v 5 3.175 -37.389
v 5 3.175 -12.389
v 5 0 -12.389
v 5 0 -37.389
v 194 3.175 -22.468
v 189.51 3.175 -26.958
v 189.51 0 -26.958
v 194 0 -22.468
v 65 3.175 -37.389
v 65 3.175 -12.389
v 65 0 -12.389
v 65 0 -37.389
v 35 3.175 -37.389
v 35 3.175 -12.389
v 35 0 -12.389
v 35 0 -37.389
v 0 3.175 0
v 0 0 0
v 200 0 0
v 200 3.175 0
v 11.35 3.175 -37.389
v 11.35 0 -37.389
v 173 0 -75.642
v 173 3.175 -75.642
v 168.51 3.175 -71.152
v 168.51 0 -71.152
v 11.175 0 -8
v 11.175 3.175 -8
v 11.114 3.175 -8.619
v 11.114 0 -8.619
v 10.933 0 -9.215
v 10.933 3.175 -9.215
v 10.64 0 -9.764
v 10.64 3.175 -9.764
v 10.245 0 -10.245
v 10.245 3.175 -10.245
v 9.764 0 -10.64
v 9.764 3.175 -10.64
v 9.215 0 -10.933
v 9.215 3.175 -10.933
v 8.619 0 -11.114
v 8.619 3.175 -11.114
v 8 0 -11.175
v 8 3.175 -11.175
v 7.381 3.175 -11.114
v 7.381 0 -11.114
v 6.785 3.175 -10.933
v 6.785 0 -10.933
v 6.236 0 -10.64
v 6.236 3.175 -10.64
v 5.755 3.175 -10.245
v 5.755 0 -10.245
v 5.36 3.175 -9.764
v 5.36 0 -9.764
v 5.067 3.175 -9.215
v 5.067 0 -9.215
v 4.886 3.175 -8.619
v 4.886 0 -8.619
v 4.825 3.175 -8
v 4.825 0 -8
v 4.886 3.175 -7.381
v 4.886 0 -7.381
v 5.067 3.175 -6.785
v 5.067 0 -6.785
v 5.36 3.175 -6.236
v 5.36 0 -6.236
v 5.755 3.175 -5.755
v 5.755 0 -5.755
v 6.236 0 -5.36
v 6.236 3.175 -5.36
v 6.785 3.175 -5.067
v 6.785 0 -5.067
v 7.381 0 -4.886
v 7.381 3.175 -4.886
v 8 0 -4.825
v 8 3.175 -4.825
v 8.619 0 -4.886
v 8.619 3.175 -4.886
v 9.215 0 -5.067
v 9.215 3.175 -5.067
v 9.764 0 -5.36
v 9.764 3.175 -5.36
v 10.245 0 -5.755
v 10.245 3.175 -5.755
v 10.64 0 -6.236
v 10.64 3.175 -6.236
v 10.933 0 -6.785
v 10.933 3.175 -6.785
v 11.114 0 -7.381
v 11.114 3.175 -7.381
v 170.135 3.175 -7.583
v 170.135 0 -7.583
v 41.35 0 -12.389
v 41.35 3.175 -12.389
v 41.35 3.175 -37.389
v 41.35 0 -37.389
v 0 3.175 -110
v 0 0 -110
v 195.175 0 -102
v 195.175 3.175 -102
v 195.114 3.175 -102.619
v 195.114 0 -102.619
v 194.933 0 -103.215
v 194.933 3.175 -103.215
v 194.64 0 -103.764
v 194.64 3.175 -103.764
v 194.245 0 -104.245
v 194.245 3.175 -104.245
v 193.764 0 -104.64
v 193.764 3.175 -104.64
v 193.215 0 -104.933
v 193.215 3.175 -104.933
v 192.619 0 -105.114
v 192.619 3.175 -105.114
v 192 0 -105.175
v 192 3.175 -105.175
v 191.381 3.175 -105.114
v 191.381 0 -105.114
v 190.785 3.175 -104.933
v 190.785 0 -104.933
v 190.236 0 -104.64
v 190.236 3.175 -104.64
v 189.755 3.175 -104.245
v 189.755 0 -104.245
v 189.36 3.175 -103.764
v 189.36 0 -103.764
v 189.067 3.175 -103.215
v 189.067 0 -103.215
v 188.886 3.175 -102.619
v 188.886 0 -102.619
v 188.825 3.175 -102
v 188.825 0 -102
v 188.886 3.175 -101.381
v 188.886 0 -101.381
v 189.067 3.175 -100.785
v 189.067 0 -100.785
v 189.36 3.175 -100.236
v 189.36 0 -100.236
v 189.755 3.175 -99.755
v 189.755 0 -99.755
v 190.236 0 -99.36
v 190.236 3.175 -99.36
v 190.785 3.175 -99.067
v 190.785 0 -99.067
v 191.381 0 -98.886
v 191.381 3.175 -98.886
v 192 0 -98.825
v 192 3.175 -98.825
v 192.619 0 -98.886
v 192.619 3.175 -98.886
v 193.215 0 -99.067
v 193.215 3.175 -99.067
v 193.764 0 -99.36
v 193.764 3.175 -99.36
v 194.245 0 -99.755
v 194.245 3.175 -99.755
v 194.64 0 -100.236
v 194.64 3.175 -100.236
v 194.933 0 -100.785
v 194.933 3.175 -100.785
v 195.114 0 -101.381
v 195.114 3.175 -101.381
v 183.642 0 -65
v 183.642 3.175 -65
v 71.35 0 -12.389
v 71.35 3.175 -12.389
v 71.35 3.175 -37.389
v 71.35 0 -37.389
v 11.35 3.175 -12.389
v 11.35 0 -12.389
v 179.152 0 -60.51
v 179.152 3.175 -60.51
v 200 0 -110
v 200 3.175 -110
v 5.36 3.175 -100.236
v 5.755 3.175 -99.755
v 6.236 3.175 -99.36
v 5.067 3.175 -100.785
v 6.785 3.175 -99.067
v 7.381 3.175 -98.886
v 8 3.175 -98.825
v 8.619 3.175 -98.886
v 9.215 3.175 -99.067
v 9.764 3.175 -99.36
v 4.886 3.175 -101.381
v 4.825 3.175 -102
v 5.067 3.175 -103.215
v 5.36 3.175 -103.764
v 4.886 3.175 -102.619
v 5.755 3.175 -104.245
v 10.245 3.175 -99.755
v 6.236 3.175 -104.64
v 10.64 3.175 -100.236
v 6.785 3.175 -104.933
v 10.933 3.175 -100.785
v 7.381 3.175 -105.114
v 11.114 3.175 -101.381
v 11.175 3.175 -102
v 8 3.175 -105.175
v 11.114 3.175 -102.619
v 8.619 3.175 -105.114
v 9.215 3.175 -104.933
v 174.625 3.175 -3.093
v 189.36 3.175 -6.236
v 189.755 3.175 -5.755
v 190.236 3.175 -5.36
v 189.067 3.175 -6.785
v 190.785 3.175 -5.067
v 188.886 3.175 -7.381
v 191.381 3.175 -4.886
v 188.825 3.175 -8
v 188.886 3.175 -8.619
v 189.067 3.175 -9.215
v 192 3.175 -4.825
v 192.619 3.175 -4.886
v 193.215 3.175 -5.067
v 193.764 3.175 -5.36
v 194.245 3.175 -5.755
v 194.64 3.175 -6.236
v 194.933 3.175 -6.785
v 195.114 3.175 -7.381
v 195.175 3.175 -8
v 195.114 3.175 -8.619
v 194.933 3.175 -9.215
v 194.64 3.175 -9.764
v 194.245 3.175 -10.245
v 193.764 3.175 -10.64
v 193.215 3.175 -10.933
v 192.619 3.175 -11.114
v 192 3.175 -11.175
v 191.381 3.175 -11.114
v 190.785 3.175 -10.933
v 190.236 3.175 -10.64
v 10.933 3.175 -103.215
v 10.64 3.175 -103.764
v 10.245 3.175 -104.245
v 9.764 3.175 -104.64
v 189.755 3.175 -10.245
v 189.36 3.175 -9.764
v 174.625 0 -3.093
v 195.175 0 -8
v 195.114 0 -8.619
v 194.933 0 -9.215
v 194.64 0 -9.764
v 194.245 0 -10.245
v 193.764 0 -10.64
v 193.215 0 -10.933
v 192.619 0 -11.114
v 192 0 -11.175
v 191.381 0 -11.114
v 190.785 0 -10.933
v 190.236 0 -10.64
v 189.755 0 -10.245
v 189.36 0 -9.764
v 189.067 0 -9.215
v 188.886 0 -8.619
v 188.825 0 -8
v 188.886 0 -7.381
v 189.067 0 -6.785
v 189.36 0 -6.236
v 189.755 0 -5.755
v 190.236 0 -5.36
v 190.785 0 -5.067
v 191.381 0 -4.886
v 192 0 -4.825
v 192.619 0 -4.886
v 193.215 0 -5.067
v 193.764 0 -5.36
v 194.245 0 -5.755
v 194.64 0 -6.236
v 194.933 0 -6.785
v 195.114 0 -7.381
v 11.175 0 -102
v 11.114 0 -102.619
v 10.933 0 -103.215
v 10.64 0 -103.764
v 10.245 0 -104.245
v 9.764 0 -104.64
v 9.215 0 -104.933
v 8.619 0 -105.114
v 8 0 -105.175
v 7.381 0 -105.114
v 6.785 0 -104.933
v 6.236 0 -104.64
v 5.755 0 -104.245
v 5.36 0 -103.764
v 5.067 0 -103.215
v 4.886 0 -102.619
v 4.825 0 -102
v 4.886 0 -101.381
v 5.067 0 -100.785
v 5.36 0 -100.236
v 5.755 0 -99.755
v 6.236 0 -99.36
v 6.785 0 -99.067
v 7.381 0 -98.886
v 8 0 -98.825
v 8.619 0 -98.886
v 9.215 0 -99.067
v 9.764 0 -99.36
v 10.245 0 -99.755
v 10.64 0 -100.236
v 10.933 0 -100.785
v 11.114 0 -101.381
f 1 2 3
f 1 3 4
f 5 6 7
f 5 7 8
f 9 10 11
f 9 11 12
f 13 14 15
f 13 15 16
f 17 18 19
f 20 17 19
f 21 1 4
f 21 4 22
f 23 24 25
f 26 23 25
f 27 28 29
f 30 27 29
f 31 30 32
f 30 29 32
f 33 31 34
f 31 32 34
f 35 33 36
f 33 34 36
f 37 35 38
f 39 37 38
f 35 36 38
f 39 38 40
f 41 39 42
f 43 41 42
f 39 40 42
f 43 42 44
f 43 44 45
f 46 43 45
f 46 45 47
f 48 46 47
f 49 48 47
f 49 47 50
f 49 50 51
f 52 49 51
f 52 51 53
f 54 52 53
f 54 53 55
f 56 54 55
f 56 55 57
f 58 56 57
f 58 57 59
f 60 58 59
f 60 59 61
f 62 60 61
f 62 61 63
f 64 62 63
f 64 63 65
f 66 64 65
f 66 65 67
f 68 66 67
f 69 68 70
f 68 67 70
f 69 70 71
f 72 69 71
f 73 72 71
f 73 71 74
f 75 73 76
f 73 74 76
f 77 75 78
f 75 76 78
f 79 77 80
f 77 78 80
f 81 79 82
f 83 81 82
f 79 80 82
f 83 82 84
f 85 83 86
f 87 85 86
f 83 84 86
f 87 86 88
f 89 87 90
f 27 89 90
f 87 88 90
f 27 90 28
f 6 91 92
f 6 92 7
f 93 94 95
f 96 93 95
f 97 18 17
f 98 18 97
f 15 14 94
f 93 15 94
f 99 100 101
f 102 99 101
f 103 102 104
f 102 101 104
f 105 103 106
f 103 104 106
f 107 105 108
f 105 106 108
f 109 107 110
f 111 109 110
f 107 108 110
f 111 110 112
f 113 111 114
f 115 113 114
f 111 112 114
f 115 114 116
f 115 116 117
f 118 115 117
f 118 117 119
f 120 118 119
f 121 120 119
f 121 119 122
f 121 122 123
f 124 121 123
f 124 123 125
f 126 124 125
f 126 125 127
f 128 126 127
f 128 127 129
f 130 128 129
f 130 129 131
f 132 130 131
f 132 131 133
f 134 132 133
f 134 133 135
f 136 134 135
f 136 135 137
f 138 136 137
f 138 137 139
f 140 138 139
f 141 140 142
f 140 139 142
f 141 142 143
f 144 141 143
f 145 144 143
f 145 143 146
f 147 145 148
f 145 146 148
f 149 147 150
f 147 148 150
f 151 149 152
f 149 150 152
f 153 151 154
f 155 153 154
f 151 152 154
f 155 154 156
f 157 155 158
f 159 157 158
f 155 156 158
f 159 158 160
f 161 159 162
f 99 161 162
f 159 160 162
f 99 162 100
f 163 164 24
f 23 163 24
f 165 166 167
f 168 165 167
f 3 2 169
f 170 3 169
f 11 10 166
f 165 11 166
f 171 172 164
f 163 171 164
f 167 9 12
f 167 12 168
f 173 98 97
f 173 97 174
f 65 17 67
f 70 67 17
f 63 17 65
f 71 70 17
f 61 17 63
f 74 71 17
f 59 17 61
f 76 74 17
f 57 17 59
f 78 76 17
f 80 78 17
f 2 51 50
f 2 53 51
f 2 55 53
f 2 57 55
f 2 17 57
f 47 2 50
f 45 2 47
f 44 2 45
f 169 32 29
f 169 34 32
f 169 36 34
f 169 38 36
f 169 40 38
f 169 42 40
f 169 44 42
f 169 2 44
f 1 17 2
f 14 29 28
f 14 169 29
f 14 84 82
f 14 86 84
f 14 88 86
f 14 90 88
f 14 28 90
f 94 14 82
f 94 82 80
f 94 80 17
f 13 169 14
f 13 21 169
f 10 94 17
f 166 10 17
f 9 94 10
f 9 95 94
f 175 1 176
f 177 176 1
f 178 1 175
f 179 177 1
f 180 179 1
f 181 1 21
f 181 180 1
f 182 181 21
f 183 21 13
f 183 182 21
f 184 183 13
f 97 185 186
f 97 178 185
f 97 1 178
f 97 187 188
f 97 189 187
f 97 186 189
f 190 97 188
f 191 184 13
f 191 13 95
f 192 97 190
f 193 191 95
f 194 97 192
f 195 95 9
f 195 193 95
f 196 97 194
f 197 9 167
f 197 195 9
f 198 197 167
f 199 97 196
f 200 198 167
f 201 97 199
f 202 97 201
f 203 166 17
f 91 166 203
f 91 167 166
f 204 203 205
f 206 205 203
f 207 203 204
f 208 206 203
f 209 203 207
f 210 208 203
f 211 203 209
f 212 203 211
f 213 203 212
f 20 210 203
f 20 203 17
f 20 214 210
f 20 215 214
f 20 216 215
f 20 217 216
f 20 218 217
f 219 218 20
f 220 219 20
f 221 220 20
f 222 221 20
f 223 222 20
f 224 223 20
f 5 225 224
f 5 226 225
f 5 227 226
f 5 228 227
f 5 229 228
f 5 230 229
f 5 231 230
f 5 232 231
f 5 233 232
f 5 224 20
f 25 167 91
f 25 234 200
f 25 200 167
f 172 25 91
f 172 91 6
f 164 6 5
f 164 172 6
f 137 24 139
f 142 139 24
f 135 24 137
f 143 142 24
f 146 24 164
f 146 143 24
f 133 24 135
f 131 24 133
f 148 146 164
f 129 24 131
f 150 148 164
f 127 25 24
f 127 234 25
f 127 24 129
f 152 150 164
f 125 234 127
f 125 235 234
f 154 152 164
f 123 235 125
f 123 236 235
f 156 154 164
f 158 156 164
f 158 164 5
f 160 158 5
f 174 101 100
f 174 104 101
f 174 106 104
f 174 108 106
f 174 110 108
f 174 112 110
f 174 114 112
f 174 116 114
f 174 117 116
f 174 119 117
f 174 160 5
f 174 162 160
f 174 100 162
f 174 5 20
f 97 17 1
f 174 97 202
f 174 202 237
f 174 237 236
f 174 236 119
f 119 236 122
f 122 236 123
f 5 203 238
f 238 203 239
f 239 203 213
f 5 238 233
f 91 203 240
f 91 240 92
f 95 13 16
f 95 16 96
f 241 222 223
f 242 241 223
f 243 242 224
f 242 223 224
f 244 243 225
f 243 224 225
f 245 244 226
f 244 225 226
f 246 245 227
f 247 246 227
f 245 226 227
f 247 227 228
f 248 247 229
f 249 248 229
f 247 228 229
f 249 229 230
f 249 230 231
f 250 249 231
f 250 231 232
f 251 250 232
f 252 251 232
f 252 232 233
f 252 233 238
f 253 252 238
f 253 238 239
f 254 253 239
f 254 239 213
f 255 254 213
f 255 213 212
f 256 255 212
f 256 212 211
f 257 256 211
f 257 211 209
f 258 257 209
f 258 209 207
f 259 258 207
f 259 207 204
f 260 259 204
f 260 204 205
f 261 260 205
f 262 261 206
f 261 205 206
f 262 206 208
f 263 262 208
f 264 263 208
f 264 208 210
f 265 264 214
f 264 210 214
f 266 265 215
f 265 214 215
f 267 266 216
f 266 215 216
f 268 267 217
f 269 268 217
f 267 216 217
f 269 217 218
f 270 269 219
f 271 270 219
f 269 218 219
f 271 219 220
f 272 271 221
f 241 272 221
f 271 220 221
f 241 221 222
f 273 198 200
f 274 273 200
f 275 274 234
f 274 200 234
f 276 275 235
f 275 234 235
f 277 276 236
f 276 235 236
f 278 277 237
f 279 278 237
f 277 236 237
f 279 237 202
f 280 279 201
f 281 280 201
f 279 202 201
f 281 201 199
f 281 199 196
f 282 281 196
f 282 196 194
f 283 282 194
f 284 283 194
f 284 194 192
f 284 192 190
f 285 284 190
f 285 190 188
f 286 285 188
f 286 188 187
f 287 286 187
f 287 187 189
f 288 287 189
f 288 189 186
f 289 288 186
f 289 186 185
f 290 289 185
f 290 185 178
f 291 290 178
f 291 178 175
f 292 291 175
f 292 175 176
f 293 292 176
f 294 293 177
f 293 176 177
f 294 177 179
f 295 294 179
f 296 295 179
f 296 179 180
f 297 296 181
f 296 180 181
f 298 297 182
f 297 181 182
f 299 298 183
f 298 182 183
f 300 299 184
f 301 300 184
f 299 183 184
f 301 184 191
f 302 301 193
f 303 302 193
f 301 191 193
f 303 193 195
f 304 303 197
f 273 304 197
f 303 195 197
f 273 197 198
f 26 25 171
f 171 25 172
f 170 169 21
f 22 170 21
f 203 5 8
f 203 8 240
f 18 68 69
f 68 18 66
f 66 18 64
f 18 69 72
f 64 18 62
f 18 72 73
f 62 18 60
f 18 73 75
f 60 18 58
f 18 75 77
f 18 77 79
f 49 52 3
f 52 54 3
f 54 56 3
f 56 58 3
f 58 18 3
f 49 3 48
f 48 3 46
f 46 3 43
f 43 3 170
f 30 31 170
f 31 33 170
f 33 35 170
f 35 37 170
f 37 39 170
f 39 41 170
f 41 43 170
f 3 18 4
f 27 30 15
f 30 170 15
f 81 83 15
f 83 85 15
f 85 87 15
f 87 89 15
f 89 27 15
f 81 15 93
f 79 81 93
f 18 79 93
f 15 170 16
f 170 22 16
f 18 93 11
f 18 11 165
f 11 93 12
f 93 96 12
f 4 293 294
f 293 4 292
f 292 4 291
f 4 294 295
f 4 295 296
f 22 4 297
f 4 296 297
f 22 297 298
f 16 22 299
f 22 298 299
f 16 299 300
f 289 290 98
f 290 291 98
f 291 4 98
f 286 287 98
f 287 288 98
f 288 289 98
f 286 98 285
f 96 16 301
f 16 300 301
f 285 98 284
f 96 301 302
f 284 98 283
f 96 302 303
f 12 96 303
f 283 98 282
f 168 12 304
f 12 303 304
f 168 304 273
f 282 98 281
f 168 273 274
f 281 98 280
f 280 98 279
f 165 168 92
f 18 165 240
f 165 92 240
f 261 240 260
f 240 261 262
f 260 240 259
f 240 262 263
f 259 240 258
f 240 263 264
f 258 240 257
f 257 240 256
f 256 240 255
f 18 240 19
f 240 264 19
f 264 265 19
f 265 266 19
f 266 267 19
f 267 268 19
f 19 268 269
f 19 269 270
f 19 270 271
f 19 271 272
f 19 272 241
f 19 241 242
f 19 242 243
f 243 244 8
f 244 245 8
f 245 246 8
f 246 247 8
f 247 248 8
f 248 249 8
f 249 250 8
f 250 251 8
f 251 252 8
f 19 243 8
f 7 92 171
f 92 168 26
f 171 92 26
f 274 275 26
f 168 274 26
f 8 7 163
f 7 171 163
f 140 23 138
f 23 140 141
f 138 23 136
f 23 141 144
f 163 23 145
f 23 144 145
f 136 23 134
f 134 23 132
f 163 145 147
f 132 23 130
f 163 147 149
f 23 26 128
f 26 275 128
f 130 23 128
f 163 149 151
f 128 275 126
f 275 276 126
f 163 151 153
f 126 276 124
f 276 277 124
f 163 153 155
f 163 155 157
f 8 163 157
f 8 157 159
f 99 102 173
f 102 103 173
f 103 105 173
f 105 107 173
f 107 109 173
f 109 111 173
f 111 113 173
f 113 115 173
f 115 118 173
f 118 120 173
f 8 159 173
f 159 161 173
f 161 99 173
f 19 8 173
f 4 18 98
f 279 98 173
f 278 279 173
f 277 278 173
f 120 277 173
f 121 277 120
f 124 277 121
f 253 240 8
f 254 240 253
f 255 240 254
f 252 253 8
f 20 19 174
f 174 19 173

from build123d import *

# Parameters (mm, degrees)
SKETCH1_W           = 200
SKETCH1_H           = 110
BOSS_EXTRUDE1_DEPTH = 3.175
CUT_EXTRUDE1_REACH  = 230.276
CUT_EXTRUDE2_REACH  = 230.276
CUT_EXTRUDE3_REACH  = 230.276
SKETCH4_W           = 6.35
SKETCH4_H           = 25
SKETCH5_R           = 3.175
CUT_EXTRUDE4_DEPTH  = 10
LPATTERN1_COUNT     = 3
LPATTERN1_PITCH     = 30


with BuildPart() as part:
    # Sketch1 → Boss-Extrude1 (new body)
    with BuildSketch(Plane(origin=(0, 0, 0), x_dir=(1, 0, 0), z_dir=(0, 1, 0))):
        with Locations((100, 55)):
            Rectangle(SKETCH1_W, SKETCH1_H)
    extrude(amount=BOSS_EXTRUDE1_DEPTH)

    # Sketch2 → Cut-Extrude1 (cut, up to next)
    with BuildSketch(Plane(origin=(0, 3.175, 0), x_dir=(1, 0, 0), z_dir=(0, 1, 0)), mode=Mode.PRIVATE) as cut_extrude1_sk1:
        Polygon((194, 22.467727943), (174.625274195, 3.093002139), (170.135146135, 7.583130199), (189.509871939, 26.957856004), align=None)
    cut_extrude1_tool1 = extrude(cut_extrude1_sk1.sketch, amount=-CUT_EXTRUDE1_REACH, mode=Mode.PRIVATE) & part.part
    add(cut_extrude1_tool1.solids().sort_by_distance((182.067573, 3.175, -15.025429))[0], mode=Mode.SUBTRACT)

    # Sketch3 → Cut-Extrude2 (cut, up to next)
    with BuildSketch(Plane(origin=(0, 3.175, 0), x_dir=(1, 0, 0), z_dir=(0, 1, 0)), mode=Mode.PRIVATE) as cut_extrude2_sk1:
        Polygon((168.509871939, 71.151828996), (179.151828996, 60.509871939), (183.641957057, 65), (173, 75.641957057), align=None)
    cut_extrude2_tool1 = extrude(cut_extrude2_sk1.sketch, amount=-CUT_EXTRUDE2_REACH, mode=Mode.PRIVATE) & part.part
    add(cut_extrude2_tool1.solids().sort_by_distance((176.075914, 3.175, -68.075914))[0], mode=Mode.SUBTRACT)

    # Sketch4 → Cut-Extrude3 (cut, up to next)
    with BuildSketch(Plane(origin=(0, 3.175, 0), x_dir=(1, 0, 0), z_dir=(0, 1, 0)), mode=Mode.PRIVATE) as cut_extrude3_sk1:
        with Locations((8.175, 24.889181128)):
            Rectangle(SKETCH4_W, SKETCH4_H)
    cut_extrude3_tool1 = extrude(cut_extrude3_sk1.sketch, amount=-CUT_EXTRUDE3_REACH, mode=Mode.PRIVATE) & part.part
    cut_extrude3 = cut_extrude3_tool1.solids().sort_by_distance((8.175, 3.175, -24.889181))[0]
    add(cut_extrude3, mode=Mode.SUBTRACT)

    # Sketch5 → Cut-Extrude4 (cut)
    with BuildSketch(Plane(origin=(0, 3.175, 0), x_dir=(1, 0, 0), z_dir=(0, 1, 0))):
        with Locations((8, 102)):
            Circle(SKETCH5_R)
        with Locations((192, 102)):
            Circle(SKETCH5_R)
        with Locations((192, 8)):
            Circle(SKETCH5_R)
        with Locations((8, 8)):
            Circle(SKETCH5_R)
    extrude(amount=-CUT_EXTRUDE4_DEPTH, mode=Mode.SUBTRACT)

    # LPattern1: Cut-Extrude3 ×3
    with Locations(*[(i * LPATTERN1_PITCH, 0, 0) for i in range(1, LPATTERN1_COUNT)]):
        add(cut_extrude3, mode=Mode.SUBTRACT)


solid = part.part
